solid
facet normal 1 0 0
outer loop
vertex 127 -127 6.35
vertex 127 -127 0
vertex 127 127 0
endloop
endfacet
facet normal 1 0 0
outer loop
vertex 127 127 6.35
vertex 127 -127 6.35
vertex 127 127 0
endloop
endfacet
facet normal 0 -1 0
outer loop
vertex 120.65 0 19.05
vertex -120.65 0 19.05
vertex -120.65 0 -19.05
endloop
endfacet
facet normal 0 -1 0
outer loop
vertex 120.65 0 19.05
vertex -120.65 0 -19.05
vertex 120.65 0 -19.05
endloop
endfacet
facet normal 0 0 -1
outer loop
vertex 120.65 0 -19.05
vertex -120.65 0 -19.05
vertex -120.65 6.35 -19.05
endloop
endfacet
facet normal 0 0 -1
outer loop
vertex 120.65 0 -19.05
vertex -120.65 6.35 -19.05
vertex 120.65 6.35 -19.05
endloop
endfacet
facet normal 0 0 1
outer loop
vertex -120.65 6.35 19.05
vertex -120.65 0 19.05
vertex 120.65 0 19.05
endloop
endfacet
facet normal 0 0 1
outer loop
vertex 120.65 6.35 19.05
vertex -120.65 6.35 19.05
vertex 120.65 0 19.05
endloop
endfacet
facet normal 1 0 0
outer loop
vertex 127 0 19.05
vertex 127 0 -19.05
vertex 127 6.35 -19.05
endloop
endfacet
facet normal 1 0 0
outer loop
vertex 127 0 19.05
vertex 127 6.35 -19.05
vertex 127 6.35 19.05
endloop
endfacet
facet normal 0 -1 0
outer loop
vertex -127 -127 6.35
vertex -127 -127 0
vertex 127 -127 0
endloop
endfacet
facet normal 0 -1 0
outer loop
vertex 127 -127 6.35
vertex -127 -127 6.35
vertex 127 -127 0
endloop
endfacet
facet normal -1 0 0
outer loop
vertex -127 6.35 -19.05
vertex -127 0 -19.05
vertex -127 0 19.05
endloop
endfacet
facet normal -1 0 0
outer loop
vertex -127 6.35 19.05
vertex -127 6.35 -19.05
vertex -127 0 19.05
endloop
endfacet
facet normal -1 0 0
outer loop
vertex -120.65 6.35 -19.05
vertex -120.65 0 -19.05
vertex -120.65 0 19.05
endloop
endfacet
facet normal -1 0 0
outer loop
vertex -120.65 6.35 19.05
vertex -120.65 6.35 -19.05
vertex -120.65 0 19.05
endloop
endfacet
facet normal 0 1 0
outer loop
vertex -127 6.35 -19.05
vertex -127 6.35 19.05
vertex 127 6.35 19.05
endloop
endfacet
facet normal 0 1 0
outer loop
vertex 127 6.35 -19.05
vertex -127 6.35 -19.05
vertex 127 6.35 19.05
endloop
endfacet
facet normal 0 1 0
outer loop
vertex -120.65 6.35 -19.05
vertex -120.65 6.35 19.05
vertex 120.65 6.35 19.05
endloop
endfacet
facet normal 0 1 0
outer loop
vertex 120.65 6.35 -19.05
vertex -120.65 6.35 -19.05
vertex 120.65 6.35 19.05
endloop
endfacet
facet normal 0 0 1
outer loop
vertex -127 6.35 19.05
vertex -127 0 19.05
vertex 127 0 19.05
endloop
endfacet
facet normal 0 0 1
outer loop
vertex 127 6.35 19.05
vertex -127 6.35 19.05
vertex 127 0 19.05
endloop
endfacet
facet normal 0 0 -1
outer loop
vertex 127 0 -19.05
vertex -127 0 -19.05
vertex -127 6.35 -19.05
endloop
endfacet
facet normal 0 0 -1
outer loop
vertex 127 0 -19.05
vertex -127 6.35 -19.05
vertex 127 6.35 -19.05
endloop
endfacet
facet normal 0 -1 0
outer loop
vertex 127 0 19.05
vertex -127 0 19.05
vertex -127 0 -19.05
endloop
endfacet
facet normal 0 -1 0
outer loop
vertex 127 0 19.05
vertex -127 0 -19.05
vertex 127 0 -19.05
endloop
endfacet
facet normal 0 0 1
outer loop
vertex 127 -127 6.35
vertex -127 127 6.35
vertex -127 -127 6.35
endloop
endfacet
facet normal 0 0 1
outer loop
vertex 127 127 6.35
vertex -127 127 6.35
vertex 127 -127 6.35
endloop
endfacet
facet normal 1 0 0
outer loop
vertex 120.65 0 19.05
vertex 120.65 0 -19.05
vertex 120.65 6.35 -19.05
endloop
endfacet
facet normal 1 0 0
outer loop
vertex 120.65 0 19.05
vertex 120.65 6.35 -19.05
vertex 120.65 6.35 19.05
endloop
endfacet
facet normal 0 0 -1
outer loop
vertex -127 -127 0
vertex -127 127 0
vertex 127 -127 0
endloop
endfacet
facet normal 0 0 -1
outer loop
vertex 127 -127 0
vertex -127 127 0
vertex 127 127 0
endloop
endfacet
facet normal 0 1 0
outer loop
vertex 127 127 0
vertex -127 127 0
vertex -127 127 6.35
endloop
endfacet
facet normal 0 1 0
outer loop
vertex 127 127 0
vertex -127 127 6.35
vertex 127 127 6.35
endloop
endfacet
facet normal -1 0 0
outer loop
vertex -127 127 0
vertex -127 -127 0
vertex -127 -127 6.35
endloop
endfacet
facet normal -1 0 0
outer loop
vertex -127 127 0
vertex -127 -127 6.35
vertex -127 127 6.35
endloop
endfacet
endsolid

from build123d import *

# Parameters (mm, degrees)
F0_W     = 254
F0_H     = 254
F1_DEPTH = 6.35
F2_W     = 254
F2_H     = 38.1
F3_DEPTH = 6.35
F4_W     = 241.3
F4_H     = 38.1
F5_DEPTH = 6.35


with BuildPart() as f1:
    # F0 (on Top) → F1 (new body)
    with BuildSketch(Plane.XY):
        Rectangle(F0_W, F0_H)
    extrude(amount=F1_DEPTH)


with BuildPart() as f3:
    # F2 (on Front) → F3 (new body)
    with BuildSketch(Plane.XZ):
        Rectangle(F2_W, F2_H)
    extrude(amount=-F3_DEPTH)


with BuildPart() as f5:
    # F4 (on Front) → F5 (new body)
    with BuildSketch(Plane.XZ):
        Rectangle(F4_W, F4_H)
    extrude(amount=-F5_DEPTH)


solid = Compound([f1.part, f3.part, f5.part])
